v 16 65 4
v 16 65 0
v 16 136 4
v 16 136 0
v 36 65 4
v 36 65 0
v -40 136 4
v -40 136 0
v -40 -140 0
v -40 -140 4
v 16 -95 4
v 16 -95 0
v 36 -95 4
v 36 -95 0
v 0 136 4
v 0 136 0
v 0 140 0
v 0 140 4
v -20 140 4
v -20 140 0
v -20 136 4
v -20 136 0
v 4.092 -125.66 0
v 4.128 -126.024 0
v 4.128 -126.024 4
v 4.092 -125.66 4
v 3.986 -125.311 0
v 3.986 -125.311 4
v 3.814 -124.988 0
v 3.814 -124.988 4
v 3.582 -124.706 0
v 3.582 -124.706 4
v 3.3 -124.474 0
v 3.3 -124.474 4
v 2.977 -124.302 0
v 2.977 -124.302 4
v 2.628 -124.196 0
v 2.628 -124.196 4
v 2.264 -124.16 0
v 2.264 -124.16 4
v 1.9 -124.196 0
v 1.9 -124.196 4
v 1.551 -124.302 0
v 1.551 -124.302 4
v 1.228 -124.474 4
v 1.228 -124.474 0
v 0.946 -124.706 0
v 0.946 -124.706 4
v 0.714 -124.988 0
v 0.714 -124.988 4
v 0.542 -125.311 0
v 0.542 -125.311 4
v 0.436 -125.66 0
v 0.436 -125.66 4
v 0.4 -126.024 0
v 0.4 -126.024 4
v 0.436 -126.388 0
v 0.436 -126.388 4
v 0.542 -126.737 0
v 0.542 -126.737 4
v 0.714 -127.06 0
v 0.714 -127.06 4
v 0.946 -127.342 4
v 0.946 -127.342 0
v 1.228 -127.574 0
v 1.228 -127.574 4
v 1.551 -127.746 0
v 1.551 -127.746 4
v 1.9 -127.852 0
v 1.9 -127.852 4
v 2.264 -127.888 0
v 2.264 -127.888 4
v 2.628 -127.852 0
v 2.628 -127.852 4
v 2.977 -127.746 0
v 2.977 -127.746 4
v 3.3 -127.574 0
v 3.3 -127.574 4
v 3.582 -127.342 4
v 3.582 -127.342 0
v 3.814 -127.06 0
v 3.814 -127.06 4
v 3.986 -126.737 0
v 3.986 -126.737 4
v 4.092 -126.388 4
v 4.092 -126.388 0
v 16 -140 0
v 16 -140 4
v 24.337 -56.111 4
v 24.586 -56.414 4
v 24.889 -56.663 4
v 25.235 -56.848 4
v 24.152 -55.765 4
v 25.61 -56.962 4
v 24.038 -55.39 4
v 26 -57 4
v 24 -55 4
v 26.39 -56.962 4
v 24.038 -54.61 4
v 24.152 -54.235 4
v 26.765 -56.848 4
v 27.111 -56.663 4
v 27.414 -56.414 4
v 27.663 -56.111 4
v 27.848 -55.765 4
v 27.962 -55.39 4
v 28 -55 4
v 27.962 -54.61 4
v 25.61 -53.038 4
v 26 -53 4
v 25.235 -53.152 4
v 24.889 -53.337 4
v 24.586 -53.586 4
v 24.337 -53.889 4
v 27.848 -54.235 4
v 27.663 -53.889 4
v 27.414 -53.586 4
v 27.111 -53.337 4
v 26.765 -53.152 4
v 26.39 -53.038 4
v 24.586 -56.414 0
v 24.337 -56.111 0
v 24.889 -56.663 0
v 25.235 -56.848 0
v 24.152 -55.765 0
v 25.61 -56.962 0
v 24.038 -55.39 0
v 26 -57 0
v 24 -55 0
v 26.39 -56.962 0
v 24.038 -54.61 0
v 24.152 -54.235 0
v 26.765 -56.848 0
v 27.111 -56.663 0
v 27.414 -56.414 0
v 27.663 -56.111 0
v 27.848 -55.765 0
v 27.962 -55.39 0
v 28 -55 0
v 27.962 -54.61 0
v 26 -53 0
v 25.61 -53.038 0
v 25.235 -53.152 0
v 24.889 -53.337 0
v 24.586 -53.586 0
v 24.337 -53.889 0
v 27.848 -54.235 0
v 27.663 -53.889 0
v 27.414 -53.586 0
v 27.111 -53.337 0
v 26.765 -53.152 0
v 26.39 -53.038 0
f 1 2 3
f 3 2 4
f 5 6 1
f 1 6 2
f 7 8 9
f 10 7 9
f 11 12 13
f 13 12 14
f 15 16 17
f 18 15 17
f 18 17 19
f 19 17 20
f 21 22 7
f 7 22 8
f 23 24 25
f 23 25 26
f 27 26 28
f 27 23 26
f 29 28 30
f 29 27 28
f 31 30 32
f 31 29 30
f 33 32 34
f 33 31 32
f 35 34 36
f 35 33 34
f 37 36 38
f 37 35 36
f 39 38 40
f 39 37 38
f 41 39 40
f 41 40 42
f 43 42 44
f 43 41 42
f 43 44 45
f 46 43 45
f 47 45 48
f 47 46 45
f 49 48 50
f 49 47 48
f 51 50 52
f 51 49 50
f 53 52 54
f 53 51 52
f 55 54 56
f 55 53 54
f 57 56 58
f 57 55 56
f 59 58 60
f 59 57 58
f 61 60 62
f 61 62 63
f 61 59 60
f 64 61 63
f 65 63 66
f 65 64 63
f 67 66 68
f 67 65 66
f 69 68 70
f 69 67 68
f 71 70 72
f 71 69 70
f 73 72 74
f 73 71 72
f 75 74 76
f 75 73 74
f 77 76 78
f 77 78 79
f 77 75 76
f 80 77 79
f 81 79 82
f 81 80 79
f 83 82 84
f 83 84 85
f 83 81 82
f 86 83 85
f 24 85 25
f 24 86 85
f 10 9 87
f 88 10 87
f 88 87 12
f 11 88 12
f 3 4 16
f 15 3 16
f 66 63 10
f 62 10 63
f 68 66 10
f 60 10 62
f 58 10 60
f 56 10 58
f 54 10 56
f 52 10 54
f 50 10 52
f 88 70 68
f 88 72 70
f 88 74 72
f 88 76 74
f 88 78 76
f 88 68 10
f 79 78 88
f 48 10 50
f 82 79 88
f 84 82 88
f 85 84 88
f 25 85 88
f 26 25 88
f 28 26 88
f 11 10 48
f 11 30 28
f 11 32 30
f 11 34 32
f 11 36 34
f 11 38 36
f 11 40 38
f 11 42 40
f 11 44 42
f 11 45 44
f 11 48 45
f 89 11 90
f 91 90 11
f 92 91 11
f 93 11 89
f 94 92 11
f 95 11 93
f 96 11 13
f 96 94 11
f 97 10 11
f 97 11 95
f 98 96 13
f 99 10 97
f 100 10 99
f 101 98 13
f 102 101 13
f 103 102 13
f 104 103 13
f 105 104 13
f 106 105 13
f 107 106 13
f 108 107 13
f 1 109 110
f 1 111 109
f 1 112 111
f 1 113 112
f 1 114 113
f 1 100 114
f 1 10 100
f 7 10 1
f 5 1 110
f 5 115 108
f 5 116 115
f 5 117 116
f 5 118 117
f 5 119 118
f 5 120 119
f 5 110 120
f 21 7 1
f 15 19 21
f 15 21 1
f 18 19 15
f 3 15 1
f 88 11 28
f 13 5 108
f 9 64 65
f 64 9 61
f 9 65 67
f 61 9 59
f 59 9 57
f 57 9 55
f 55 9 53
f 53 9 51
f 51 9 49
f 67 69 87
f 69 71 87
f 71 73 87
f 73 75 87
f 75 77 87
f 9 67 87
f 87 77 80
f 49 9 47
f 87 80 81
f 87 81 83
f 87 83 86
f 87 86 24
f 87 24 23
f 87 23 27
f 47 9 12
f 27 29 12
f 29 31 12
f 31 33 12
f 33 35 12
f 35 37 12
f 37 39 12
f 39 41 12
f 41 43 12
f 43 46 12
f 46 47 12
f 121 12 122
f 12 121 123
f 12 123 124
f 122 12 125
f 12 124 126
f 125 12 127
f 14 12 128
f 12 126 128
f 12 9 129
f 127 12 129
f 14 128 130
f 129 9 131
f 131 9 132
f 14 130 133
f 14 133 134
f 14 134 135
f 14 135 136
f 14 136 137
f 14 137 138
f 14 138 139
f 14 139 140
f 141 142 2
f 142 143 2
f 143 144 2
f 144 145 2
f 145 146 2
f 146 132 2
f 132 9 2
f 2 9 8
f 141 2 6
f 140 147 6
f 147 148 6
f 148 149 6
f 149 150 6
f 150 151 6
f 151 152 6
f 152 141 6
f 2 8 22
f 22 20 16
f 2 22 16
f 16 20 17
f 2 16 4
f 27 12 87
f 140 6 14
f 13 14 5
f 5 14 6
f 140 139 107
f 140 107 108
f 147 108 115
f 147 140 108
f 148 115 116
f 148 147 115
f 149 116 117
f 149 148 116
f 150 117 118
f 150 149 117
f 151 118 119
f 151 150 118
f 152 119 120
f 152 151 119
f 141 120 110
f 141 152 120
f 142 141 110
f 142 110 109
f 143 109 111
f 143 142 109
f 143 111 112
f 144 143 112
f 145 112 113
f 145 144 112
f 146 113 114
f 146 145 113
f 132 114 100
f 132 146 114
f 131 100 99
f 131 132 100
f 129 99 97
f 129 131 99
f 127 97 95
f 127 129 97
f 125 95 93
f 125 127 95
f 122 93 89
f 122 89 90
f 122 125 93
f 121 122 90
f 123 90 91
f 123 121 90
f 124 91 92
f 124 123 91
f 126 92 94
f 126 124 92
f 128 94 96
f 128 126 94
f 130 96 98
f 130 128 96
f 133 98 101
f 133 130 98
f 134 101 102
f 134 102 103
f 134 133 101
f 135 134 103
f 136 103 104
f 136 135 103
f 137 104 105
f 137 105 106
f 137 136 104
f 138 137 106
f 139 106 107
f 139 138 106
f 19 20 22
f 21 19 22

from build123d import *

# Parameters (mm, degrees)
SKETCH1_R           = 1.864189773
SKETCH1_R_2         = 2
BOSS_EXTRUDE1_DEPTH = 4


with BuildPart() as part:
    # Sketch1 → Boss-Extrude1 (new body)
    with BuildSketch(Plane.XY):
        Polygon((16, 65), (16, 136), (0, 136), (0, 140), (-20, 140), (-20, 136), (-40, 136), (-40, -140), (16, -140), (16, -95), (36, -95), (36, 65), align=None)
        with Locations((2.263986992, -126.02409254)):
            Circle(SKETCH1_R, mode=Mode.SUBTRACT)
        with Locations((26, -55)):
            Circle(SKETCH1_R_2, mode=Mode.SUBTRACT)
    extrude(amount=BOSS_EXTRUDE1_DEPTH)


solid = part.part
